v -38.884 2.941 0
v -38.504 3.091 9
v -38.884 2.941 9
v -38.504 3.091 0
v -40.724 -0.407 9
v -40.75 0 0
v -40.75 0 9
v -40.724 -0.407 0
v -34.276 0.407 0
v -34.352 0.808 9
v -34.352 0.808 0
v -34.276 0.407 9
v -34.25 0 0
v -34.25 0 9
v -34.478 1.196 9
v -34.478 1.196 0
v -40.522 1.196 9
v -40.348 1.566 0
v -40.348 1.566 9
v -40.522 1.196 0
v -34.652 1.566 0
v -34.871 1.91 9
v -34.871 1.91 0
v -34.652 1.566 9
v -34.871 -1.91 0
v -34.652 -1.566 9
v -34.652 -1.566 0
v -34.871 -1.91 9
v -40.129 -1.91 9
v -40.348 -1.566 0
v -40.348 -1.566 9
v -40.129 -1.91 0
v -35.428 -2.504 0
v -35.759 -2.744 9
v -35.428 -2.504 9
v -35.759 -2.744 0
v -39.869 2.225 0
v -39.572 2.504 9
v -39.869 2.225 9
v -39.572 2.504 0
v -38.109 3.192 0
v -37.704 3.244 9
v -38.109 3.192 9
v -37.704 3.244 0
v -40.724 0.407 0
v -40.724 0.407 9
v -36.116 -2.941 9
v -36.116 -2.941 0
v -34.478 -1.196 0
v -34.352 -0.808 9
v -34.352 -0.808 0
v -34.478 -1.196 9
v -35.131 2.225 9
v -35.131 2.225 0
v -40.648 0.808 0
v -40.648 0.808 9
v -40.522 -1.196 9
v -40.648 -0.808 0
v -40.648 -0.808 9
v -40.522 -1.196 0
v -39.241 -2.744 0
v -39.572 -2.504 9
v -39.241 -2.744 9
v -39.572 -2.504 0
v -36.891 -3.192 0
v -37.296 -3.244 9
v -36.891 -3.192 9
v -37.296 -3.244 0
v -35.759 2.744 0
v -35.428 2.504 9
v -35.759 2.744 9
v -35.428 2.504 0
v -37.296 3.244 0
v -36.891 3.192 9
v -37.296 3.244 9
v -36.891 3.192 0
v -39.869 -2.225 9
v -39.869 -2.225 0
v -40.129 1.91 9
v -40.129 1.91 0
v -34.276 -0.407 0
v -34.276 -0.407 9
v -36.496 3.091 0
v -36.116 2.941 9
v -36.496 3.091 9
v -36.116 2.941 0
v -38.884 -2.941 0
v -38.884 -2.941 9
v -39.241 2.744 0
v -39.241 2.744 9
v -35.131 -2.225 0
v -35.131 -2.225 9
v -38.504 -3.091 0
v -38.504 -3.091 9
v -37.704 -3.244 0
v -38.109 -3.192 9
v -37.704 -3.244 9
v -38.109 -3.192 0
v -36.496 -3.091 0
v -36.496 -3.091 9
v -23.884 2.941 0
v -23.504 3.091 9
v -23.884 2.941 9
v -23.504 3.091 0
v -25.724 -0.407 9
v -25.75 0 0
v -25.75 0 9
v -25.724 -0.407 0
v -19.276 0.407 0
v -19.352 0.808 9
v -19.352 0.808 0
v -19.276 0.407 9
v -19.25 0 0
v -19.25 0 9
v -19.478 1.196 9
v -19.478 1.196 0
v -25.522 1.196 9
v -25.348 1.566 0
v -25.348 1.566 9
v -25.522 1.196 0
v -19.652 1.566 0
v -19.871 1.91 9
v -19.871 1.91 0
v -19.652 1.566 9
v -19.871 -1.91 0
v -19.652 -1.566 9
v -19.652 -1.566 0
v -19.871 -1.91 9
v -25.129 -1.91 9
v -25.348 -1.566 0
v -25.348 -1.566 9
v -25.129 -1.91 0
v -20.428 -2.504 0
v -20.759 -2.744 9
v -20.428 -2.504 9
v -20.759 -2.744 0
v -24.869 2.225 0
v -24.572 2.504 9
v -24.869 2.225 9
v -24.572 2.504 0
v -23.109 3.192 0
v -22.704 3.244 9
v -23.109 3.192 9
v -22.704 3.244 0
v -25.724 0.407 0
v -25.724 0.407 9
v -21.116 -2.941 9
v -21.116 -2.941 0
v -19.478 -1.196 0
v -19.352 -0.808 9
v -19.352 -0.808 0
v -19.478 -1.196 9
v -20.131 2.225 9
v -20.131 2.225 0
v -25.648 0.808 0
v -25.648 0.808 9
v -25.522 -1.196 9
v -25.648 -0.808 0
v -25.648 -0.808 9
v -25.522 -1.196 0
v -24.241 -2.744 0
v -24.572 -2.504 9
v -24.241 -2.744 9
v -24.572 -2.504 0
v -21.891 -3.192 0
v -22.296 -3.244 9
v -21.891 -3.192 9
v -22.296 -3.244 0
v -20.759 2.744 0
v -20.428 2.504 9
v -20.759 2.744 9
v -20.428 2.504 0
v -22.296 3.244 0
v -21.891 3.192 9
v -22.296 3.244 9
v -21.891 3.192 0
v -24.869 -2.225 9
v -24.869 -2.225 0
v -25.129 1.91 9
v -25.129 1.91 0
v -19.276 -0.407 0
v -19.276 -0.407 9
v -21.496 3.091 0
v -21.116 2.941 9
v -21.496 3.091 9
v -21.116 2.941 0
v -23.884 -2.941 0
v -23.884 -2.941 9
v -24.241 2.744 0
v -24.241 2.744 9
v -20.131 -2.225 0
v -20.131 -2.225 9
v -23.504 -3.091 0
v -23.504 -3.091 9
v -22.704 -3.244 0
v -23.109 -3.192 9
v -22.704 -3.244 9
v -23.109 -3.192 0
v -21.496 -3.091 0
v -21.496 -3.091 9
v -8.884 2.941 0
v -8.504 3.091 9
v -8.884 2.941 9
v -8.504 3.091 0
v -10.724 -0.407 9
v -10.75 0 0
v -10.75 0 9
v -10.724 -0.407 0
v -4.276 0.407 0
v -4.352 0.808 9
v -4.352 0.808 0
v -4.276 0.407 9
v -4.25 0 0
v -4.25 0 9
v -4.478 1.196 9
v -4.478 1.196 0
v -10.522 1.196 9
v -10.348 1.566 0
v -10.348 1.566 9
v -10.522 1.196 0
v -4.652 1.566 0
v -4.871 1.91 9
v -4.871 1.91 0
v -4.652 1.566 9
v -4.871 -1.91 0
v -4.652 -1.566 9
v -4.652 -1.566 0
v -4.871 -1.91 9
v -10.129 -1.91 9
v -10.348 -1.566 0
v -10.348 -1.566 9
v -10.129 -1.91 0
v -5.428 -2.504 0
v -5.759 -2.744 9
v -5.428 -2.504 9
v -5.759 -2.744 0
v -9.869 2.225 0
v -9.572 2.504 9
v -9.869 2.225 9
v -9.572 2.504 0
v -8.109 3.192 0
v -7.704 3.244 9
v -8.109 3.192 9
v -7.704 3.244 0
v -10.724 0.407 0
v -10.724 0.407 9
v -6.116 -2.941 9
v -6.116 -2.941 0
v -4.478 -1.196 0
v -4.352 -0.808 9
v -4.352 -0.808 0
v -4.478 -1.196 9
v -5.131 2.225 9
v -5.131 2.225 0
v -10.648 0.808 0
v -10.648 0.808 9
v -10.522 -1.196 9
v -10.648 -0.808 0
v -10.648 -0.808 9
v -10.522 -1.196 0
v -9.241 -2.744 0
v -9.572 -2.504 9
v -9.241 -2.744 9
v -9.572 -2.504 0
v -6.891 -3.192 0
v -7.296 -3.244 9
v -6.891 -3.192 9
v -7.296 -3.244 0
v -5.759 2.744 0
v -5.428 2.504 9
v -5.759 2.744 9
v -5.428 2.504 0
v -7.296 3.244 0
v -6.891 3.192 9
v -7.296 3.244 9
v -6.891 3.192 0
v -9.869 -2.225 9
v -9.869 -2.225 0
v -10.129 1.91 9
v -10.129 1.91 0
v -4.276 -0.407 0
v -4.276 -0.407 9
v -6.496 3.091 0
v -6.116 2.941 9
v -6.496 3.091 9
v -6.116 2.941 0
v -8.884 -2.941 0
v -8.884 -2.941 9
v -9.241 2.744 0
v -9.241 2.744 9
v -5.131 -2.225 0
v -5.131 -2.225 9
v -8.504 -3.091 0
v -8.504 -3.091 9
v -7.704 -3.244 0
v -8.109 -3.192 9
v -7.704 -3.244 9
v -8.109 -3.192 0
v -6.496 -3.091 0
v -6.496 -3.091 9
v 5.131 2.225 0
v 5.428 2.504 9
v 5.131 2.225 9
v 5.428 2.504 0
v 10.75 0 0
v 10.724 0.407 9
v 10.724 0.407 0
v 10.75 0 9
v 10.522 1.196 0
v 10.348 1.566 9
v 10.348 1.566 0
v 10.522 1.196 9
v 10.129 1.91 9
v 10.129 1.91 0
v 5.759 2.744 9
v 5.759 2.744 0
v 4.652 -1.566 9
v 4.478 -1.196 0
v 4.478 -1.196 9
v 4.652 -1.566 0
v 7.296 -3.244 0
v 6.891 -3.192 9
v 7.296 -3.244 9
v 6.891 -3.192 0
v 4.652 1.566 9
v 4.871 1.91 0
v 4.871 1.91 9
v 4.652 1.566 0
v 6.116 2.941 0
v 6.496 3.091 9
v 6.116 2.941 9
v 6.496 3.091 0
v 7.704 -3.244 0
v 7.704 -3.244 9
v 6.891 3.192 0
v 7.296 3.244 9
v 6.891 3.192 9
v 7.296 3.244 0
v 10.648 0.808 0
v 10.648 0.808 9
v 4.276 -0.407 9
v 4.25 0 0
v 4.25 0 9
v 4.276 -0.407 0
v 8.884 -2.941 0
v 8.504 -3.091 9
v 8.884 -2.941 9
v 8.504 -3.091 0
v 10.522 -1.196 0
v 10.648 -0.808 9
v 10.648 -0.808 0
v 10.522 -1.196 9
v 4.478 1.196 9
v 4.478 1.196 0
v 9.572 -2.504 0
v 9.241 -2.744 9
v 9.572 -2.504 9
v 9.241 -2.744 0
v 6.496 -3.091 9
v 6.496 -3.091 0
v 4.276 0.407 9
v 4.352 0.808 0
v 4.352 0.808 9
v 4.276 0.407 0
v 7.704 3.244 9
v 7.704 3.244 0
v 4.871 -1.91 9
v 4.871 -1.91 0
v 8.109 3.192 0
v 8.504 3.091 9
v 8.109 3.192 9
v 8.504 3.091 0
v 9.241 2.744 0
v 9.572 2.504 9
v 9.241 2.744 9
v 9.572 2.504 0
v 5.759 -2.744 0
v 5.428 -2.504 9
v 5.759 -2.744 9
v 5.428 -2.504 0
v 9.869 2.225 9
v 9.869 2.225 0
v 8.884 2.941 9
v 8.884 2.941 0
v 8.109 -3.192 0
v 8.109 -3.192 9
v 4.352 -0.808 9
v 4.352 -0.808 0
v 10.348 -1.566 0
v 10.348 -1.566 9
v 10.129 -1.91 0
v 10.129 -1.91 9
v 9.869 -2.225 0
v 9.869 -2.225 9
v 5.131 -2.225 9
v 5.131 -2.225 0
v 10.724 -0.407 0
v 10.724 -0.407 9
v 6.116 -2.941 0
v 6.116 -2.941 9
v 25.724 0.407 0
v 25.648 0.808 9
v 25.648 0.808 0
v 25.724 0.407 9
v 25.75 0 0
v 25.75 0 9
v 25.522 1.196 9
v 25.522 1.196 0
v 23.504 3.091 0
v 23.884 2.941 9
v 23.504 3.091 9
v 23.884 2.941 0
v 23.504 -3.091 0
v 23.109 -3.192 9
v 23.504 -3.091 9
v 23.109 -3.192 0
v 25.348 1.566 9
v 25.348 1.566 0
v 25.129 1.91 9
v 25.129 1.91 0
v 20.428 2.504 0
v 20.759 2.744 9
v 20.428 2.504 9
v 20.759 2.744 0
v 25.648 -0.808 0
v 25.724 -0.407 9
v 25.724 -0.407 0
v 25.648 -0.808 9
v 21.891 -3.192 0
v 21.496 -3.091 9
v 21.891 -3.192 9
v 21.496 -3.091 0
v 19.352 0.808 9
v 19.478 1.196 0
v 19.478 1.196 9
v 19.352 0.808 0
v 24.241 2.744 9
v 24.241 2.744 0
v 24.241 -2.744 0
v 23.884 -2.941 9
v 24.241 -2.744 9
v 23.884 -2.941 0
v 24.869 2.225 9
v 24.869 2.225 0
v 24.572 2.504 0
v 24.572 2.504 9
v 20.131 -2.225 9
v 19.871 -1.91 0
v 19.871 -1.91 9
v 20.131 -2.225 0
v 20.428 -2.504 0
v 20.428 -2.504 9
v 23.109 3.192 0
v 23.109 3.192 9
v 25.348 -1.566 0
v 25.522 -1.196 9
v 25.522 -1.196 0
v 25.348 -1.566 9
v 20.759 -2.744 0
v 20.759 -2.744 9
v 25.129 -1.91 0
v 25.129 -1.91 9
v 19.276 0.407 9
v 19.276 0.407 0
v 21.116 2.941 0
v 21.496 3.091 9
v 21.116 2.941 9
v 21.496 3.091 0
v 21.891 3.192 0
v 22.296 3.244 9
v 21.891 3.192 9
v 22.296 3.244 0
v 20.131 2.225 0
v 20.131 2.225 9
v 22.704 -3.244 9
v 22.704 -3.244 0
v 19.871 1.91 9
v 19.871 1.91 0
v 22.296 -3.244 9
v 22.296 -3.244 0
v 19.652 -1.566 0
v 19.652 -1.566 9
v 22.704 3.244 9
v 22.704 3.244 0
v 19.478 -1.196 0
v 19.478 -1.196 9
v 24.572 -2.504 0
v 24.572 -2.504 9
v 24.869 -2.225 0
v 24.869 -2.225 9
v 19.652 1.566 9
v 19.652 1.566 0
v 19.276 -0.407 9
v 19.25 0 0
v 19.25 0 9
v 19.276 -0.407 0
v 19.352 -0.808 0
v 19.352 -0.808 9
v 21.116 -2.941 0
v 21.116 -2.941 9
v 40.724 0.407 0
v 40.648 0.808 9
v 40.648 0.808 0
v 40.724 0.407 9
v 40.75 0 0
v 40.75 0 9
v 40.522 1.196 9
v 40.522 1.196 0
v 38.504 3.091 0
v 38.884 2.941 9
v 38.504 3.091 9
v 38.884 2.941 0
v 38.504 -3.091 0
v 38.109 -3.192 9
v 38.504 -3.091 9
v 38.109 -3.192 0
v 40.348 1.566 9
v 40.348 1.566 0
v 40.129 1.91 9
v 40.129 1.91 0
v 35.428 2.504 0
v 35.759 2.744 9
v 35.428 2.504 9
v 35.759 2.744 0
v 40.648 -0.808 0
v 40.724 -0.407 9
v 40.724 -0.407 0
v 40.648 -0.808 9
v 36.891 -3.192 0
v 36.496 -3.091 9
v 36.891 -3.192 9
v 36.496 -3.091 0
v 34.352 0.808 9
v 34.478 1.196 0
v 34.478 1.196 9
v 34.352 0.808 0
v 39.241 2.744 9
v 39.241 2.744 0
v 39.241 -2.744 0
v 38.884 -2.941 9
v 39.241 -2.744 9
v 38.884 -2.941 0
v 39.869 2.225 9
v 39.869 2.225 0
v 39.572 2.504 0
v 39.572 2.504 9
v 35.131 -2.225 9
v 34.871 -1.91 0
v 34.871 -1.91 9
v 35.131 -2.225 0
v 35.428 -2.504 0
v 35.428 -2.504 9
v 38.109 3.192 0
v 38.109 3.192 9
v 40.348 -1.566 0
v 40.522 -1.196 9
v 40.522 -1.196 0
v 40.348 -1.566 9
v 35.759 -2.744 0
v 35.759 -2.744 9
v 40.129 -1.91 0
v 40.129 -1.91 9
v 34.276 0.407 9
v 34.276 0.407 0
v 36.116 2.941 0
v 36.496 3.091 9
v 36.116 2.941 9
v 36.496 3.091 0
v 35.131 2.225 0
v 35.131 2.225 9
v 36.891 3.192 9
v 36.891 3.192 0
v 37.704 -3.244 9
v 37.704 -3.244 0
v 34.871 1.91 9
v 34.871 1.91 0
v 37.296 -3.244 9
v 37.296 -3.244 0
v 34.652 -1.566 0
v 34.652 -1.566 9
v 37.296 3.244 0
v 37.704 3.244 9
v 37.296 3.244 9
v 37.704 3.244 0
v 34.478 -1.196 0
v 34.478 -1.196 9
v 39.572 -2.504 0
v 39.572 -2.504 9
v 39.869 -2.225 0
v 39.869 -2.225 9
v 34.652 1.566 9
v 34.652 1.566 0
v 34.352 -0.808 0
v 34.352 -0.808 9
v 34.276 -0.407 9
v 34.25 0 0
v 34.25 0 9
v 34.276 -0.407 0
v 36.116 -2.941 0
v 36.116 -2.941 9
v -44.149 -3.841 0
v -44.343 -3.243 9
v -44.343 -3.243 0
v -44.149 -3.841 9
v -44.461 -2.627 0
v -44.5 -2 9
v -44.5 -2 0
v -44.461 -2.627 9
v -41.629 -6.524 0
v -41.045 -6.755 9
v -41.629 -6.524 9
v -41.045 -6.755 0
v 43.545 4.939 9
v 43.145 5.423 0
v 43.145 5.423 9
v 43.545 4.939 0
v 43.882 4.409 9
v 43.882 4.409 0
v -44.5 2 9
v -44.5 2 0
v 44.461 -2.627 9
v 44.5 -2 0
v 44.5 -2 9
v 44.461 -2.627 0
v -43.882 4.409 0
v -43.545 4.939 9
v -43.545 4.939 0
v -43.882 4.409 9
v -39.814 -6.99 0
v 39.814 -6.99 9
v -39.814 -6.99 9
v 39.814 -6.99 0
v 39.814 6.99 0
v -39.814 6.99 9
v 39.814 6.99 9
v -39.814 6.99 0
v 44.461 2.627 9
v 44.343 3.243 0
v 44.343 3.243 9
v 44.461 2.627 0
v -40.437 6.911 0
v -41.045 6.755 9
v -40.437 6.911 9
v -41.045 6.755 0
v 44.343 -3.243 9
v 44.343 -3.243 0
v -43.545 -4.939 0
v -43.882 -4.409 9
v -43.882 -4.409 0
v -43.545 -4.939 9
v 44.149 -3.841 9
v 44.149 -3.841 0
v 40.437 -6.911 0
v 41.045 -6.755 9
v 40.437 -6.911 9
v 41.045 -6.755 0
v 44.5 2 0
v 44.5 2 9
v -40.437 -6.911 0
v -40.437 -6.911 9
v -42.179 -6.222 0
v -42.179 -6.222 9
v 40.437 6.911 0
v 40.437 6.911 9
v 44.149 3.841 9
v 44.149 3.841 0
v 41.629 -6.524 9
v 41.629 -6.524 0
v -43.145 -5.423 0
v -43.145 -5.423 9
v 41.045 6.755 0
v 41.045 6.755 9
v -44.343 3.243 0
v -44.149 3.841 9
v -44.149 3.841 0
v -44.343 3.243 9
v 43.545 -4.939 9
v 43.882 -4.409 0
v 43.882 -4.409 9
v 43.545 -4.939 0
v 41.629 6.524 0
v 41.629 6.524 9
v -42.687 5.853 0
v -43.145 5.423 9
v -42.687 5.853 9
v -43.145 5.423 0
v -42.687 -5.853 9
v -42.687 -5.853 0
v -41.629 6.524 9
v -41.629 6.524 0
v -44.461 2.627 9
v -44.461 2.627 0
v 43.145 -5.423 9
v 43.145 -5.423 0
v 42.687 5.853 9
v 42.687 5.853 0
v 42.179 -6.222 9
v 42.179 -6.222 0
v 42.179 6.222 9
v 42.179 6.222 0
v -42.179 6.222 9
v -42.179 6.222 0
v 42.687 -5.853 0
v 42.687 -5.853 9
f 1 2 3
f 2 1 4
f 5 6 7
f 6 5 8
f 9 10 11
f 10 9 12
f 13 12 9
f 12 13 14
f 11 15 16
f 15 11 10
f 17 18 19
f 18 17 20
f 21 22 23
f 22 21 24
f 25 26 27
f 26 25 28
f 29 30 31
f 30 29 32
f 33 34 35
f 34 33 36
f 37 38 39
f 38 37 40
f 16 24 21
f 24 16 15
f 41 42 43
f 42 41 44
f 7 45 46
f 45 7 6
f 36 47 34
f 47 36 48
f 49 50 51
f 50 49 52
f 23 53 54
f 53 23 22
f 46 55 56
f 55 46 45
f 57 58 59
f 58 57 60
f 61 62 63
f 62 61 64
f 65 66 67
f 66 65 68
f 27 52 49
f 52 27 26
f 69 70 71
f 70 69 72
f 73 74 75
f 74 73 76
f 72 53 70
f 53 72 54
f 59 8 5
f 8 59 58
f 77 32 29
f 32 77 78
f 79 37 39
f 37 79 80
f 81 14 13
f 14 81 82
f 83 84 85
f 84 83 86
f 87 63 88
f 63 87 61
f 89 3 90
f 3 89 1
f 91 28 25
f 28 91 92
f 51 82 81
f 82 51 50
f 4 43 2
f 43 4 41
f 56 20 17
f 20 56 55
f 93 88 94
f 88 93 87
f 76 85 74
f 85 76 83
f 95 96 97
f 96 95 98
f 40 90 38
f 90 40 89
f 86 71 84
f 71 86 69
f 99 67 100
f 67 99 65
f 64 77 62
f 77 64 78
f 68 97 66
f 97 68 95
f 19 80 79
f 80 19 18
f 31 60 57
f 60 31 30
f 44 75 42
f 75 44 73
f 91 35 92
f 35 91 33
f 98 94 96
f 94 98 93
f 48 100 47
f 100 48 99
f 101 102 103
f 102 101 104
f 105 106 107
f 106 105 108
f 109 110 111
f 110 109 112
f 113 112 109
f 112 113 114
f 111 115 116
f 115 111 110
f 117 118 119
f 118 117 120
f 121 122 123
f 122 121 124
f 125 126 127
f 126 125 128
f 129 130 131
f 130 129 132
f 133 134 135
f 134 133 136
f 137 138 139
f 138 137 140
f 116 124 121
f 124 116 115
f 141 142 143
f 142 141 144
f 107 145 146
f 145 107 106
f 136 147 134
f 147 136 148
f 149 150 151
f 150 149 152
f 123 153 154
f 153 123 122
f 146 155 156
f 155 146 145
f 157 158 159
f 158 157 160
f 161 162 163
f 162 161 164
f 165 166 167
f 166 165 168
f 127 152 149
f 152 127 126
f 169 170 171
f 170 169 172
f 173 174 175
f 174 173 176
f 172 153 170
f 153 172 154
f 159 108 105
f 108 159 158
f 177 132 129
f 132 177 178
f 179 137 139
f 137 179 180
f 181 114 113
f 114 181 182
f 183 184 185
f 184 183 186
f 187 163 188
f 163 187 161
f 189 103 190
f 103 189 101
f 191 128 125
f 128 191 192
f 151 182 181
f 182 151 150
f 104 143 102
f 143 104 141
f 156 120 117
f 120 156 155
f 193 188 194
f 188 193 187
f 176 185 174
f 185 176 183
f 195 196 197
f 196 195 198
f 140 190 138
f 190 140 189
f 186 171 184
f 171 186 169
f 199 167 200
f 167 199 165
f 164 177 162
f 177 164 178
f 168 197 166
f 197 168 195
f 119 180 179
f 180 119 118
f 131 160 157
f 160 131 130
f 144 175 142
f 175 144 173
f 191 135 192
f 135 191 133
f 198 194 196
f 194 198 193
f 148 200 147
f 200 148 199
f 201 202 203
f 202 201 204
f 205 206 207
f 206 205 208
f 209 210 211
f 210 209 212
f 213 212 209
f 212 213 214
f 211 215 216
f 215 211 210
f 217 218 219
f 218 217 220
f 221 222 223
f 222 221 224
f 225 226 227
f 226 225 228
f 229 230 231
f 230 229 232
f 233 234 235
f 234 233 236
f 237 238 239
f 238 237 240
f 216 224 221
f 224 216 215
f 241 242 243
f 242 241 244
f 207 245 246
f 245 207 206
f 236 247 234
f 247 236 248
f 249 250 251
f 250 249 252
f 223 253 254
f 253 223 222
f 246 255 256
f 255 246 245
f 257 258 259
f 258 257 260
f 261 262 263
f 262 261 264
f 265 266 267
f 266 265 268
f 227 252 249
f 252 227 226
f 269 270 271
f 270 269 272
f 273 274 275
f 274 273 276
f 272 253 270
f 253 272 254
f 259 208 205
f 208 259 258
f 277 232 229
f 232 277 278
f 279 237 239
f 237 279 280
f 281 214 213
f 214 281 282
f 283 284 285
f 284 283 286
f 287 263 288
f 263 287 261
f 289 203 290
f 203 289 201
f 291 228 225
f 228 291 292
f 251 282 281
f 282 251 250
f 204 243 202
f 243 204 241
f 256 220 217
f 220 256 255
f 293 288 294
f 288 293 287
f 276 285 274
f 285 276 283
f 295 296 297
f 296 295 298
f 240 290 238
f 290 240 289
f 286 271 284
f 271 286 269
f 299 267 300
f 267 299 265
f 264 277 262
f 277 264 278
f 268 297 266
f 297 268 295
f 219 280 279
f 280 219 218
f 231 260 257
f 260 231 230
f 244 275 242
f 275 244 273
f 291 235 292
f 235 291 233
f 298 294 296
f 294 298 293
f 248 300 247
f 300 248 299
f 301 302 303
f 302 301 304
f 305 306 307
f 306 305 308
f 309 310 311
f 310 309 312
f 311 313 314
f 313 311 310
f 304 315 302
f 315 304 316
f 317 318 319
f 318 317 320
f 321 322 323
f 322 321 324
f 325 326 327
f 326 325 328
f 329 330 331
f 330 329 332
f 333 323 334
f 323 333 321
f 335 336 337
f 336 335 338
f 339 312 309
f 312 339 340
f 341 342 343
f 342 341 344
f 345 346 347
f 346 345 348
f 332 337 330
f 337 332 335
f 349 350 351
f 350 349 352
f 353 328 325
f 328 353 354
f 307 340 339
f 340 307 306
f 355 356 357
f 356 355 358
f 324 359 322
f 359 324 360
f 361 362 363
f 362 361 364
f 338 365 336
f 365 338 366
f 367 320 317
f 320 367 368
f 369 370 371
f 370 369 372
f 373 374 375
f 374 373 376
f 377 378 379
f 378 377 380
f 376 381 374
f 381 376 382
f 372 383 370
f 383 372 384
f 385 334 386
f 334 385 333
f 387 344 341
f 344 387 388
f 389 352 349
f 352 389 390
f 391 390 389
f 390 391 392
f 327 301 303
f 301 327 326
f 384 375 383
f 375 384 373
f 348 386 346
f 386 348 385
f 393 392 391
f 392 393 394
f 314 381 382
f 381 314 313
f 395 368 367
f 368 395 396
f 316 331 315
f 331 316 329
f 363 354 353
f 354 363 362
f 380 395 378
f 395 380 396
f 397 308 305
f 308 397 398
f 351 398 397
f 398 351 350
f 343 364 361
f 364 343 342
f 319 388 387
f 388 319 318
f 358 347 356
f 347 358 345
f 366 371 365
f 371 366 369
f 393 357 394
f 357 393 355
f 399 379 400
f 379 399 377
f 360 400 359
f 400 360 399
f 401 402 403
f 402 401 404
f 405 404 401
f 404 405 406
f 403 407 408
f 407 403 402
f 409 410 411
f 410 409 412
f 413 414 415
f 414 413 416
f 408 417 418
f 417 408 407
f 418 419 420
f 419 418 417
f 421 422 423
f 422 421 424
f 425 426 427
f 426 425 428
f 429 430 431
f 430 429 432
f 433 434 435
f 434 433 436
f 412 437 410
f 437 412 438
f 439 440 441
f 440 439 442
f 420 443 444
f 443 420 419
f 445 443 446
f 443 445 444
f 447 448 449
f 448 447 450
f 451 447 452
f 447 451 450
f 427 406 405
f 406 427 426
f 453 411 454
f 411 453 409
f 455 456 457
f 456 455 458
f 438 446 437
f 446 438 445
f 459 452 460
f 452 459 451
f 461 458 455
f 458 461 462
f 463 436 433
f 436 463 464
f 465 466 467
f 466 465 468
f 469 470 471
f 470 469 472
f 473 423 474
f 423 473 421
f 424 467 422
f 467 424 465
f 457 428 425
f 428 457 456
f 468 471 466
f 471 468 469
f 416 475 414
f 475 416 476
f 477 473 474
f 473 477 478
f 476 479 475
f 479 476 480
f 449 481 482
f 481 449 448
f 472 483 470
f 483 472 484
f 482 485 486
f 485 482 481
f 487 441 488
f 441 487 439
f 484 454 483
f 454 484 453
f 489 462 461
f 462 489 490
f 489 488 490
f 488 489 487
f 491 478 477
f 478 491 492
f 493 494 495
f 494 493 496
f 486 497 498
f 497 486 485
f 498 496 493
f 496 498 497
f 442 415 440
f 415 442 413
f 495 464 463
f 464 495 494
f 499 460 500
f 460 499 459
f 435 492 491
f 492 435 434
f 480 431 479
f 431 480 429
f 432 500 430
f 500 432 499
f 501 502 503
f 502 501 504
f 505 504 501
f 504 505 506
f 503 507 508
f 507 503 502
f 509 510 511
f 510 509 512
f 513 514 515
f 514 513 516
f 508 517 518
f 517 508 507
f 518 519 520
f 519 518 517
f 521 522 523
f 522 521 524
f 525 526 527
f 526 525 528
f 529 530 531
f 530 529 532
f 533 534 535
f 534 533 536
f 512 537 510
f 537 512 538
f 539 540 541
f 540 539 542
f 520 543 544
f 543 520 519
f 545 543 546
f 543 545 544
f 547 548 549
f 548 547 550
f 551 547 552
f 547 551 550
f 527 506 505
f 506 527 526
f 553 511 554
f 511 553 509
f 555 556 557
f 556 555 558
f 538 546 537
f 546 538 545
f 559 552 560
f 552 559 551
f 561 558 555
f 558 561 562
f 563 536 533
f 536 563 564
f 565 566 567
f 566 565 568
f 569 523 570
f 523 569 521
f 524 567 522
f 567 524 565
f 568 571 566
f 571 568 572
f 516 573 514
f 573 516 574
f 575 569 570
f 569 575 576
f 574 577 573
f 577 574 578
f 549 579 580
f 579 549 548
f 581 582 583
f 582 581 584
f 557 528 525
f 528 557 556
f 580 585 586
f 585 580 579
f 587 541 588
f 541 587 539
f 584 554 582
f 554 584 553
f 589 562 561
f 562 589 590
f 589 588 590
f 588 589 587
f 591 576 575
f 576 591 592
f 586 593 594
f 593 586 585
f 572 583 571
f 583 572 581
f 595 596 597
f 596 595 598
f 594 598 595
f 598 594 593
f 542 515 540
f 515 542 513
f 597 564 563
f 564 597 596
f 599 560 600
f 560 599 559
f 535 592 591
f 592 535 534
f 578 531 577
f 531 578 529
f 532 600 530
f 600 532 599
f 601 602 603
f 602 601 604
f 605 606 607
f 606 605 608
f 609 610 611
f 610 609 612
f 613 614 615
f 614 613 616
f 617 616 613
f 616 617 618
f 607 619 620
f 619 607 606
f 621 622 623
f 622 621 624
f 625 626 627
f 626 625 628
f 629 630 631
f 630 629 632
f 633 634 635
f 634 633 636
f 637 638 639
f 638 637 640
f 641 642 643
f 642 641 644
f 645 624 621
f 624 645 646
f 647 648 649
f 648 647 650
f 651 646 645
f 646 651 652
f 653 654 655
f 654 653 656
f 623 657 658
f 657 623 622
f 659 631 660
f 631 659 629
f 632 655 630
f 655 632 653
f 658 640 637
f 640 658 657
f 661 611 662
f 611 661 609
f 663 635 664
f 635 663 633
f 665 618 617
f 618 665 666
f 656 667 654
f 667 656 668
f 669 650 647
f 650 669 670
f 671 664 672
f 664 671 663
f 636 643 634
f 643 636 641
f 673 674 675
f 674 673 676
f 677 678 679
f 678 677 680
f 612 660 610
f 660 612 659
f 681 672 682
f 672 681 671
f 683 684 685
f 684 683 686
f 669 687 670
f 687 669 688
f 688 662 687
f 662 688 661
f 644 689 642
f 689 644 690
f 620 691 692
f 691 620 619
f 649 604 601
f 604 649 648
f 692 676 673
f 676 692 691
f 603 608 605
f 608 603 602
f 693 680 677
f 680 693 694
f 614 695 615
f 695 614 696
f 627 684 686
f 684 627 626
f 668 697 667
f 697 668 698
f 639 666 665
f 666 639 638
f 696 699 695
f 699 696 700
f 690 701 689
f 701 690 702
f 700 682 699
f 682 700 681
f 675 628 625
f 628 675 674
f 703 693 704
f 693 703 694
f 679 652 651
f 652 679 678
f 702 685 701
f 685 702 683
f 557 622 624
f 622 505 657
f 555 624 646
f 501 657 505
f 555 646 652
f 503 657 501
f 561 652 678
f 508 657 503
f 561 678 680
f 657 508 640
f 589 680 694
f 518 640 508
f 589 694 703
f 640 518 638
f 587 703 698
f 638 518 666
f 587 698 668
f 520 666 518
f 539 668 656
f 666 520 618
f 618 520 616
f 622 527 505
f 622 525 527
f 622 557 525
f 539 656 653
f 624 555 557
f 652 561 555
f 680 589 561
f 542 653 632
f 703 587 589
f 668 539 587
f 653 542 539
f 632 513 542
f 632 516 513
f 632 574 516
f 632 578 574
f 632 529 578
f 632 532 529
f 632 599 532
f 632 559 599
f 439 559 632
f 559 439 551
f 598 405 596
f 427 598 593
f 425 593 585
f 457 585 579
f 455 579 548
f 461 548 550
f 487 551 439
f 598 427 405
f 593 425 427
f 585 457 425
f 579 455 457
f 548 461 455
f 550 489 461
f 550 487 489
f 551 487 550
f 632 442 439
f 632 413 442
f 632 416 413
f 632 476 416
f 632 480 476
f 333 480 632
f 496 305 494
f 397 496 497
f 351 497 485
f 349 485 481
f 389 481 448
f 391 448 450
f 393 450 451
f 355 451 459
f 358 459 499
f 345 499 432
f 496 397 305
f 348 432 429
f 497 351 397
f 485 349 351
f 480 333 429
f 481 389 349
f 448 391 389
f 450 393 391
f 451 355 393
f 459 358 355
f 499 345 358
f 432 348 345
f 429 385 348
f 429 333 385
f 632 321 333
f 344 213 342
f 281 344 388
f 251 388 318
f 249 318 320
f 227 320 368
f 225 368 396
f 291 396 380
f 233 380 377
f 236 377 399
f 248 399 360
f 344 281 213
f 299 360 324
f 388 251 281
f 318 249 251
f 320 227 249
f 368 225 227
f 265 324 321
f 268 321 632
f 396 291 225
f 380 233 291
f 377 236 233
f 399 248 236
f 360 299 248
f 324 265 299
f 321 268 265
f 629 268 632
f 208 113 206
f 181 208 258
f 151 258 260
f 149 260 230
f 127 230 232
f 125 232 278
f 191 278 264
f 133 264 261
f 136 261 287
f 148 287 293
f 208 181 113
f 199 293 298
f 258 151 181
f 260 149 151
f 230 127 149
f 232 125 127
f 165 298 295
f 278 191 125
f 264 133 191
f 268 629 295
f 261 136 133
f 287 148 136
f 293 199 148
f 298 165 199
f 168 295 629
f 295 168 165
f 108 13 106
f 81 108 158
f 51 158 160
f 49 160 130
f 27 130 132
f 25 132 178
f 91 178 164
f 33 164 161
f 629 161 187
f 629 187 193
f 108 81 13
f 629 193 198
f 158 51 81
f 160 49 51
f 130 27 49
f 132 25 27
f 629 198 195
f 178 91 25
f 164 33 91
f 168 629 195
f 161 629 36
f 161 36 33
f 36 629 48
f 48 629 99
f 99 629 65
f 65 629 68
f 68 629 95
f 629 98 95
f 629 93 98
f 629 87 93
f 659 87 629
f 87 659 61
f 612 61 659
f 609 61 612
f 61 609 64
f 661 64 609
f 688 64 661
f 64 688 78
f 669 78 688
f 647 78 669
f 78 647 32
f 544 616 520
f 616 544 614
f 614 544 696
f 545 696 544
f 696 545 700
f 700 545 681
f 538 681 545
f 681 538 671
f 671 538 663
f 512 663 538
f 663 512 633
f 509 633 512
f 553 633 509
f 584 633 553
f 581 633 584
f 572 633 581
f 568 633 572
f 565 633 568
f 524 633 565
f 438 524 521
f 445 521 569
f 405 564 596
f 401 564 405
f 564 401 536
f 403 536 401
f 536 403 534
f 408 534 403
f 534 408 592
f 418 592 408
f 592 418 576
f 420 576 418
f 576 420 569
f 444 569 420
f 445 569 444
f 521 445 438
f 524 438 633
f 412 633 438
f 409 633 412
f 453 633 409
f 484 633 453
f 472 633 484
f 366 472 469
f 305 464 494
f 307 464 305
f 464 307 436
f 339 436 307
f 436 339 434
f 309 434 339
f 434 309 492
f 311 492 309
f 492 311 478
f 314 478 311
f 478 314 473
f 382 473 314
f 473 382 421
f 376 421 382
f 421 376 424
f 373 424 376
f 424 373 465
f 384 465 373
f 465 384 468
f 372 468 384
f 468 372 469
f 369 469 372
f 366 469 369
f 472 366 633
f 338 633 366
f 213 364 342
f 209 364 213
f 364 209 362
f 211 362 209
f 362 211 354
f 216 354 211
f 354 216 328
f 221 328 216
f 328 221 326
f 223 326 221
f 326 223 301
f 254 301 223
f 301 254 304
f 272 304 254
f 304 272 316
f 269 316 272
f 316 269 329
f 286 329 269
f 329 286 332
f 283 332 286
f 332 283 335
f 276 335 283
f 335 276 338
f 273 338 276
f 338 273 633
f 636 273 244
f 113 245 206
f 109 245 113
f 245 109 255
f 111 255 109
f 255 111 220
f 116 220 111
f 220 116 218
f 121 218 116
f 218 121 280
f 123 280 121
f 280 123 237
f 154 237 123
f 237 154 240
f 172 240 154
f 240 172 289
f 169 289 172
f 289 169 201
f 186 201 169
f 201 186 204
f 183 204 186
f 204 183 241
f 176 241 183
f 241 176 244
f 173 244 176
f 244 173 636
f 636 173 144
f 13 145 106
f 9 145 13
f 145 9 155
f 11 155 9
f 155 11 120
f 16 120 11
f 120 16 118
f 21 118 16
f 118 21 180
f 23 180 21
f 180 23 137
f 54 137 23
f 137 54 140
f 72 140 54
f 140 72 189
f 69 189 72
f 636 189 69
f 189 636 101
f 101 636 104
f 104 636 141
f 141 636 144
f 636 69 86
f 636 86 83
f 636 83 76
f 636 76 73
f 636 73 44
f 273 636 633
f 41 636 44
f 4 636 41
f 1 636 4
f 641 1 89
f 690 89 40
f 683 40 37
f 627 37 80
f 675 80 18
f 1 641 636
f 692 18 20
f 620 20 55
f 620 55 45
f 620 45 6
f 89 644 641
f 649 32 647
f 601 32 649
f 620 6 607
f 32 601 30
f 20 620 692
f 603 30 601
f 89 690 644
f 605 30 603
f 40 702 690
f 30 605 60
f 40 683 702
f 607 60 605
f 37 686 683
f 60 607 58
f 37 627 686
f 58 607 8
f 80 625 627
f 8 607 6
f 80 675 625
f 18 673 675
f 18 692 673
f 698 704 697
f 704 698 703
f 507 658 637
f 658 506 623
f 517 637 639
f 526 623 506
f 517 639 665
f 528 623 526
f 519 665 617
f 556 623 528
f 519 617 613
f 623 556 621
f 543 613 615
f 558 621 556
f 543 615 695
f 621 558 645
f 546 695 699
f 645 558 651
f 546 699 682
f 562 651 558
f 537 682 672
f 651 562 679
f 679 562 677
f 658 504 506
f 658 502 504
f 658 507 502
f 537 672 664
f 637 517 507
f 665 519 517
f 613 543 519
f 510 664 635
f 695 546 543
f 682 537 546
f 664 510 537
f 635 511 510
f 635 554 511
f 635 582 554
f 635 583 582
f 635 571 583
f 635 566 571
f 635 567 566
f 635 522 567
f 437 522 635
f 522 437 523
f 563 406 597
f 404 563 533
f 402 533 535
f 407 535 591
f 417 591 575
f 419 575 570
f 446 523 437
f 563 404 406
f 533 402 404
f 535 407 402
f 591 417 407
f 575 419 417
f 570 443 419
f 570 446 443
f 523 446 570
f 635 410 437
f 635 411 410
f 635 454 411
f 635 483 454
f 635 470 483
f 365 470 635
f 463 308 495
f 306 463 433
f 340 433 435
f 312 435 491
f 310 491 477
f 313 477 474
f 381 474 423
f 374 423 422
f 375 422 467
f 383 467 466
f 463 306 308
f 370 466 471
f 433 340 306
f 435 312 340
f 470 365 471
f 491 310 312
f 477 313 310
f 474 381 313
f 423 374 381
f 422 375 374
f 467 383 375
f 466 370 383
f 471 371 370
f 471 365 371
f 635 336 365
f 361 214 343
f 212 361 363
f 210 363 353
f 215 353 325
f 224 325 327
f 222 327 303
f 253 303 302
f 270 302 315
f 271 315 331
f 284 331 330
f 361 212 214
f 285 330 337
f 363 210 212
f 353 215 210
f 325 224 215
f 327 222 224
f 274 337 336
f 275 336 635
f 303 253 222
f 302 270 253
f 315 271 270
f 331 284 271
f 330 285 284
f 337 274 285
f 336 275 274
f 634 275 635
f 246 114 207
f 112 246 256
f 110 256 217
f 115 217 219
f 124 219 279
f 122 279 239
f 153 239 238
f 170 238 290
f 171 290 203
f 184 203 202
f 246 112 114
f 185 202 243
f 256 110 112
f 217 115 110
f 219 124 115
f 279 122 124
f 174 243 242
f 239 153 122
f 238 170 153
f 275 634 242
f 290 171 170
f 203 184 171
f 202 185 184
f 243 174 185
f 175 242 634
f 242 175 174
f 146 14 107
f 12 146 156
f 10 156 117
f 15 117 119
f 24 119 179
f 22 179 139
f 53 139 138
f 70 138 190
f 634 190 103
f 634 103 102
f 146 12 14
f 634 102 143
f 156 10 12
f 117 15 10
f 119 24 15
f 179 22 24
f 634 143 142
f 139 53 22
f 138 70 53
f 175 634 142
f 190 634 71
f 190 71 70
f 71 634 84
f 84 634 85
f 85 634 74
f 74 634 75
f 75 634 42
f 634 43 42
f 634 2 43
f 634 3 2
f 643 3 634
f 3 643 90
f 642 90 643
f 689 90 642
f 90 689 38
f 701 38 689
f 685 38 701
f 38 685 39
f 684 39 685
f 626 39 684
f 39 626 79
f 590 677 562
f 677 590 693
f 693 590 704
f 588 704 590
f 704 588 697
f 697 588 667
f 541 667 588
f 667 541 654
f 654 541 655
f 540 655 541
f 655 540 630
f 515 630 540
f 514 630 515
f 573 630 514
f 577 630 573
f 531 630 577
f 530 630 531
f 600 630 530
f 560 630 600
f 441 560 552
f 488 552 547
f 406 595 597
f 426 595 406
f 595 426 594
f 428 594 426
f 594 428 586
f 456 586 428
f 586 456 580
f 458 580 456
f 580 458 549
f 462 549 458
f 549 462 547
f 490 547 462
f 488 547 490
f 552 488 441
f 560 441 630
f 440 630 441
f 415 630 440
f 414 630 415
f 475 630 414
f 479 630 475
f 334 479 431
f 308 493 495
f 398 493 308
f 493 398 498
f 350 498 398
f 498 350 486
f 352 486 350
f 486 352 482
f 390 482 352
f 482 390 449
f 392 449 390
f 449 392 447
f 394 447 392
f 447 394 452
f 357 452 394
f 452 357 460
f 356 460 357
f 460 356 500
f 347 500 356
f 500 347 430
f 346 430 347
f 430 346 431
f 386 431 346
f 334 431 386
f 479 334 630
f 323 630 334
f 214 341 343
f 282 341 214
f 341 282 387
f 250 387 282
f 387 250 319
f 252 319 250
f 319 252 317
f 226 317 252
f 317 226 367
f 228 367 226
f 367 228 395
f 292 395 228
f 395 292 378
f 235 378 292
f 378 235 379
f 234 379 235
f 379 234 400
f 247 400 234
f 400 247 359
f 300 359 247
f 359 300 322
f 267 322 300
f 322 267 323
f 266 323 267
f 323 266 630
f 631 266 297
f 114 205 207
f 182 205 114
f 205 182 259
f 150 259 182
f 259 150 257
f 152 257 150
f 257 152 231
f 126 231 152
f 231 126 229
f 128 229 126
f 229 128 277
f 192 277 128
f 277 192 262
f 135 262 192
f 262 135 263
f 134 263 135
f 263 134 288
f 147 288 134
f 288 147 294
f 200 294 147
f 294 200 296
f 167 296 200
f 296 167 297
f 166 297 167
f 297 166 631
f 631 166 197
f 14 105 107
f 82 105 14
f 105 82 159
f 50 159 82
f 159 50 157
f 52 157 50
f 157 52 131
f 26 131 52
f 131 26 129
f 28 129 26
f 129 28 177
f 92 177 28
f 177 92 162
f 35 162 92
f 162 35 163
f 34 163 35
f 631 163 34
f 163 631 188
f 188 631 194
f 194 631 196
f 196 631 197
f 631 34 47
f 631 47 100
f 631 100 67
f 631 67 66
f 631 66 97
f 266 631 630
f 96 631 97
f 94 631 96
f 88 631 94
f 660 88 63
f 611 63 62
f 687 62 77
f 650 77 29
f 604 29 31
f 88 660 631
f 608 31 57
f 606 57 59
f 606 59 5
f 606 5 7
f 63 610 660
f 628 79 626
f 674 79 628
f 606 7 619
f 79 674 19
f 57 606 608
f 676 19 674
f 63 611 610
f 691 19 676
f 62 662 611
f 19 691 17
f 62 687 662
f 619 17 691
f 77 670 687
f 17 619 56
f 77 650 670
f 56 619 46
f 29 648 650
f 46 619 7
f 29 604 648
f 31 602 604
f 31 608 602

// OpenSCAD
$fn = 50;


difference() {
	union() {
		hull() {
			translate(v = [-39.5000000000, 2.0000000000, 0]) {
				cylinder(h = 9, r = 5);
			}
			translate(v = [39.5000000000, 2.0000000000, 0]) {
				cylinder(h = 9, r = 5);
			}
			translate(v = [-39.5000000000, -2.0000000000, 0]) {
				cylinder(h = 9, r = 5);
			}
			translate(v = [39.5000000000, -2.0000000000, 0]) {
				cylinder(h = 9, r = 5);
			}
		}
	}
	union() {
		translate(v = [-37.5000000000, 0.0000000000, -100.0000000000]) {
			cylinder(h = 200, r = 3.2500000000);
		}
		translate(v = [-22.5000000000, 0.0000000000, -100.0000000000]) {
			cylinder(h = 200, r = 3.2500000000);
		}
		translate(v = [-7.5000000000, 0.0000000000, -100.0000000000]) {
			cylinder(h = 200, r = 3.2500000000);
		}
		translate(v = [7.5000000000, 0.0000000000, -100.0000000000]) {
			cylinder(h = 200, r = 3.2500000000);
		}
		translate(v = [22.5000000000, 0.0000000000, -100.0000000000]) {
			cylinder(h = 200, r = 3.2500000000);
		}
		translate(v = [37.5000000000, 0.0000000000, -100.0000000000]) {
			cylinder(h = 200, r = 3.2500000000);
		}
	}
}
